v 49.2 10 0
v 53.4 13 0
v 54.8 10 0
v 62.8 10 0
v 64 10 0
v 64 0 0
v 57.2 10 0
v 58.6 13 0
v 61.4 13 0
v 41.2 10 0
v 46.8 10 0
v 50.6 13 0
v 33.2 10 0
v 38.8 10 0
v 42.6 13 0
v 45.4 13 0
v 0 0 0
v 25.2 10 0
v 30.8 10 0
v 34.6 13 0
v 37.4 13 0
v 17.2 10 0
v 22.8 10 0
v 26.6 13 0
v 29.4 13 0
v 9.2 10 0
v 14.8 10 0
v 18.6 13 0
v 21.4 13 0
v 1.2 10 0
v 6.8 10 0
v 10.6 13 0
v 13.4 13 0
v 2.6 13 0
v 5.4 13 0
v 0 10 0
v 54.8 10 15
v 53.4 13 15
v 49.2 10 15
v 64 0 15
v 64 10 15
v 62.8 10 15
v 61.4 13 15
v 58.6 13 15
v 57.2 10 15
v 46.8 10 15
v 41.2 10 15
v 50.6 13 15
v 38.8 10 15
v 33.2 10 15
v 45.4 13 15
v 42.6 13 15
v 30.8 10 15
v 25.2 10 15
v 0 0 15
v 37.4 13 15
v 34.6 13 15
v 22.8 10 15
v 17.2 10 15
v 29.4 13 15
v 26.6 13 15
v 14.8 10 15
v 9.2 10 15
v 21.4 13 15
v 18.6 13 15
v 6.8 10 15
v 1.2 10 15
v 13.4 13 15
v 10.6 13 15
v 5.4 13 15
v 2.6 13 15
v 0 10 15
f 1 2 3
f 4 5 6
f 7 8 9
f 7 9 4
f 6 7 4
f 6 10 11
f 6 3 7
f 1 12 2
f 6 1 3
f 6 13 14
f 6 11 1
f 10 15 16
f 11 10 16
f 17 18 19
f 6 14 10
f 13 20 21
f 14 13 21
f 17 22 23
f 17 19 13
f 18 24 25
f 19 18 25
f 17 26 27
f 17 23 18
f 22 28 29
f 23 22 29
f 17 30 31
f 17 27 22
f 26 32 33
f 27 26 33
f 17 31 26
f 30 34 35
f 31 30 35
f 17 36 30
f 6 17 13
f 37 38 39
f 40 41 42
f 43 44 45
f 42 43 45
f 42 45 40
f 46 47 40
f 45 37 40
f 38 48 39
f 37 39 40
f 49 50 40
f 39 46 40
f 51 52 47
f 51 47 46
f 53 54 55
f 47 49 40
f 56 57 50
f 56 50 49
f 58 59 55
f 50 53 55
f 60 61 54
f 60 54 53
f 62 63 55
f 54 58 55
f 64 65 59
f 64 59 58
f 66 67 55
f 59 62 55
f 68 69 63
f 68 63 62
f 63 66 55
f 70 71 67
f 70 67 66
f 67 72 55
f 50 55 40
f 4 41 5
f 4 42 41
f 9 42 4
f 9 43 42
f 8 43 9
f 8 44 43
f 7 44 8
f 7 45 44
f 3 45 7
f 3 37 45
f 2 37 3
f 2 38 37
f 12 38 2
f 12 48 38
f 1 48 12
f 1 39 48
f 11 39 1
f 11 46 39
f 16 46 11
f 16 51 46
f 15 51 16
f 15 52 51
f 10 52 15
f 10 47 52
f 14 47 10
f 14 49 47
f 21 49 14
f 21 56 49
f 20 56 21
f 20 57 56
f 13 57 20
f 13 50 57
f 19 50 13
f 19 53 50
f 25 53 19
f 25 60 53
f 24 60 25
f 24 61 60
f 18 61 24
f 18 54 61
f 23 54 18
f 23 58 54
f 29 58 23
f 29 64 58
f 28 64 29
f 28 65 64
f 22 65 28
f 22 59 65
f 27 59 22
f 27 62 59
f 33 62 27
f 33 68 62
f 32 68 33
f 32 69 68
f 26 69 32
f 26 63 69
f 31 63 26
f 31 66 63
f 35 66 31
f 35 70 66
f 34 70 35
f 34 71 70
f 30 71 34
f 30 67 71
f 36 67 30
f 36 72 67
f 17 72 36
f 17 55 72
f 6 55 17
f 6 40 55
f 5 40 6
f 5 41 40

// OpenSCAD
$fn = 32;

// ----------------------------------------------------------------------
// Gear rack: 8 teeth, pitch 8 mm
// ----------------------------------------------------------------------

// --- parameters (mm) ---
teeth = 8;                // number of teeth
pitch = 8;                // tooth pitch, X
root_w = 5.6;             // tooth width at the root
tip_w = 2.8;              // tooth width at the tip
base_h = 10;              // rack body height, Y
tooth_h = 3;              // tooth height above the body
plate_t = 15;             // rack width, Z (extrusion height)

rack_l = teeth * pitch;  // overall length
total_h = base_h + tooth_h;  // overall height

profile = [[0, 0], [64, 0], [64, 10], [62.8, 10], [61.4, 13], [58.6, 13], [57.2, 10], [54.8, 10], [53.4, 13], [50.6, 13], [49.2, 10], [46.8, 10], [45.4, 13], [42.6, 13], [41.2, 10], [38.8, 10], [37.4, 13], [34.6, 13], [33.2, 10], [30.8, 10], [29.4, 13], [26.6, 13], [25.2, 10], [22.8, 10], [21.4, 13], [18.6, 13], [17.2, 10], [14.8, 10], [13.4, 13], [10.6, 13], [9.2, 10], [6.8, 10], [5.4, 13], [2.6, 13], [1.2, 10], [0, 10]];  // primary outline, 36 points, counter clockwise

// --- the one profile operation ---
linear_extrude(height = plate_t) polygon(points = profile);
